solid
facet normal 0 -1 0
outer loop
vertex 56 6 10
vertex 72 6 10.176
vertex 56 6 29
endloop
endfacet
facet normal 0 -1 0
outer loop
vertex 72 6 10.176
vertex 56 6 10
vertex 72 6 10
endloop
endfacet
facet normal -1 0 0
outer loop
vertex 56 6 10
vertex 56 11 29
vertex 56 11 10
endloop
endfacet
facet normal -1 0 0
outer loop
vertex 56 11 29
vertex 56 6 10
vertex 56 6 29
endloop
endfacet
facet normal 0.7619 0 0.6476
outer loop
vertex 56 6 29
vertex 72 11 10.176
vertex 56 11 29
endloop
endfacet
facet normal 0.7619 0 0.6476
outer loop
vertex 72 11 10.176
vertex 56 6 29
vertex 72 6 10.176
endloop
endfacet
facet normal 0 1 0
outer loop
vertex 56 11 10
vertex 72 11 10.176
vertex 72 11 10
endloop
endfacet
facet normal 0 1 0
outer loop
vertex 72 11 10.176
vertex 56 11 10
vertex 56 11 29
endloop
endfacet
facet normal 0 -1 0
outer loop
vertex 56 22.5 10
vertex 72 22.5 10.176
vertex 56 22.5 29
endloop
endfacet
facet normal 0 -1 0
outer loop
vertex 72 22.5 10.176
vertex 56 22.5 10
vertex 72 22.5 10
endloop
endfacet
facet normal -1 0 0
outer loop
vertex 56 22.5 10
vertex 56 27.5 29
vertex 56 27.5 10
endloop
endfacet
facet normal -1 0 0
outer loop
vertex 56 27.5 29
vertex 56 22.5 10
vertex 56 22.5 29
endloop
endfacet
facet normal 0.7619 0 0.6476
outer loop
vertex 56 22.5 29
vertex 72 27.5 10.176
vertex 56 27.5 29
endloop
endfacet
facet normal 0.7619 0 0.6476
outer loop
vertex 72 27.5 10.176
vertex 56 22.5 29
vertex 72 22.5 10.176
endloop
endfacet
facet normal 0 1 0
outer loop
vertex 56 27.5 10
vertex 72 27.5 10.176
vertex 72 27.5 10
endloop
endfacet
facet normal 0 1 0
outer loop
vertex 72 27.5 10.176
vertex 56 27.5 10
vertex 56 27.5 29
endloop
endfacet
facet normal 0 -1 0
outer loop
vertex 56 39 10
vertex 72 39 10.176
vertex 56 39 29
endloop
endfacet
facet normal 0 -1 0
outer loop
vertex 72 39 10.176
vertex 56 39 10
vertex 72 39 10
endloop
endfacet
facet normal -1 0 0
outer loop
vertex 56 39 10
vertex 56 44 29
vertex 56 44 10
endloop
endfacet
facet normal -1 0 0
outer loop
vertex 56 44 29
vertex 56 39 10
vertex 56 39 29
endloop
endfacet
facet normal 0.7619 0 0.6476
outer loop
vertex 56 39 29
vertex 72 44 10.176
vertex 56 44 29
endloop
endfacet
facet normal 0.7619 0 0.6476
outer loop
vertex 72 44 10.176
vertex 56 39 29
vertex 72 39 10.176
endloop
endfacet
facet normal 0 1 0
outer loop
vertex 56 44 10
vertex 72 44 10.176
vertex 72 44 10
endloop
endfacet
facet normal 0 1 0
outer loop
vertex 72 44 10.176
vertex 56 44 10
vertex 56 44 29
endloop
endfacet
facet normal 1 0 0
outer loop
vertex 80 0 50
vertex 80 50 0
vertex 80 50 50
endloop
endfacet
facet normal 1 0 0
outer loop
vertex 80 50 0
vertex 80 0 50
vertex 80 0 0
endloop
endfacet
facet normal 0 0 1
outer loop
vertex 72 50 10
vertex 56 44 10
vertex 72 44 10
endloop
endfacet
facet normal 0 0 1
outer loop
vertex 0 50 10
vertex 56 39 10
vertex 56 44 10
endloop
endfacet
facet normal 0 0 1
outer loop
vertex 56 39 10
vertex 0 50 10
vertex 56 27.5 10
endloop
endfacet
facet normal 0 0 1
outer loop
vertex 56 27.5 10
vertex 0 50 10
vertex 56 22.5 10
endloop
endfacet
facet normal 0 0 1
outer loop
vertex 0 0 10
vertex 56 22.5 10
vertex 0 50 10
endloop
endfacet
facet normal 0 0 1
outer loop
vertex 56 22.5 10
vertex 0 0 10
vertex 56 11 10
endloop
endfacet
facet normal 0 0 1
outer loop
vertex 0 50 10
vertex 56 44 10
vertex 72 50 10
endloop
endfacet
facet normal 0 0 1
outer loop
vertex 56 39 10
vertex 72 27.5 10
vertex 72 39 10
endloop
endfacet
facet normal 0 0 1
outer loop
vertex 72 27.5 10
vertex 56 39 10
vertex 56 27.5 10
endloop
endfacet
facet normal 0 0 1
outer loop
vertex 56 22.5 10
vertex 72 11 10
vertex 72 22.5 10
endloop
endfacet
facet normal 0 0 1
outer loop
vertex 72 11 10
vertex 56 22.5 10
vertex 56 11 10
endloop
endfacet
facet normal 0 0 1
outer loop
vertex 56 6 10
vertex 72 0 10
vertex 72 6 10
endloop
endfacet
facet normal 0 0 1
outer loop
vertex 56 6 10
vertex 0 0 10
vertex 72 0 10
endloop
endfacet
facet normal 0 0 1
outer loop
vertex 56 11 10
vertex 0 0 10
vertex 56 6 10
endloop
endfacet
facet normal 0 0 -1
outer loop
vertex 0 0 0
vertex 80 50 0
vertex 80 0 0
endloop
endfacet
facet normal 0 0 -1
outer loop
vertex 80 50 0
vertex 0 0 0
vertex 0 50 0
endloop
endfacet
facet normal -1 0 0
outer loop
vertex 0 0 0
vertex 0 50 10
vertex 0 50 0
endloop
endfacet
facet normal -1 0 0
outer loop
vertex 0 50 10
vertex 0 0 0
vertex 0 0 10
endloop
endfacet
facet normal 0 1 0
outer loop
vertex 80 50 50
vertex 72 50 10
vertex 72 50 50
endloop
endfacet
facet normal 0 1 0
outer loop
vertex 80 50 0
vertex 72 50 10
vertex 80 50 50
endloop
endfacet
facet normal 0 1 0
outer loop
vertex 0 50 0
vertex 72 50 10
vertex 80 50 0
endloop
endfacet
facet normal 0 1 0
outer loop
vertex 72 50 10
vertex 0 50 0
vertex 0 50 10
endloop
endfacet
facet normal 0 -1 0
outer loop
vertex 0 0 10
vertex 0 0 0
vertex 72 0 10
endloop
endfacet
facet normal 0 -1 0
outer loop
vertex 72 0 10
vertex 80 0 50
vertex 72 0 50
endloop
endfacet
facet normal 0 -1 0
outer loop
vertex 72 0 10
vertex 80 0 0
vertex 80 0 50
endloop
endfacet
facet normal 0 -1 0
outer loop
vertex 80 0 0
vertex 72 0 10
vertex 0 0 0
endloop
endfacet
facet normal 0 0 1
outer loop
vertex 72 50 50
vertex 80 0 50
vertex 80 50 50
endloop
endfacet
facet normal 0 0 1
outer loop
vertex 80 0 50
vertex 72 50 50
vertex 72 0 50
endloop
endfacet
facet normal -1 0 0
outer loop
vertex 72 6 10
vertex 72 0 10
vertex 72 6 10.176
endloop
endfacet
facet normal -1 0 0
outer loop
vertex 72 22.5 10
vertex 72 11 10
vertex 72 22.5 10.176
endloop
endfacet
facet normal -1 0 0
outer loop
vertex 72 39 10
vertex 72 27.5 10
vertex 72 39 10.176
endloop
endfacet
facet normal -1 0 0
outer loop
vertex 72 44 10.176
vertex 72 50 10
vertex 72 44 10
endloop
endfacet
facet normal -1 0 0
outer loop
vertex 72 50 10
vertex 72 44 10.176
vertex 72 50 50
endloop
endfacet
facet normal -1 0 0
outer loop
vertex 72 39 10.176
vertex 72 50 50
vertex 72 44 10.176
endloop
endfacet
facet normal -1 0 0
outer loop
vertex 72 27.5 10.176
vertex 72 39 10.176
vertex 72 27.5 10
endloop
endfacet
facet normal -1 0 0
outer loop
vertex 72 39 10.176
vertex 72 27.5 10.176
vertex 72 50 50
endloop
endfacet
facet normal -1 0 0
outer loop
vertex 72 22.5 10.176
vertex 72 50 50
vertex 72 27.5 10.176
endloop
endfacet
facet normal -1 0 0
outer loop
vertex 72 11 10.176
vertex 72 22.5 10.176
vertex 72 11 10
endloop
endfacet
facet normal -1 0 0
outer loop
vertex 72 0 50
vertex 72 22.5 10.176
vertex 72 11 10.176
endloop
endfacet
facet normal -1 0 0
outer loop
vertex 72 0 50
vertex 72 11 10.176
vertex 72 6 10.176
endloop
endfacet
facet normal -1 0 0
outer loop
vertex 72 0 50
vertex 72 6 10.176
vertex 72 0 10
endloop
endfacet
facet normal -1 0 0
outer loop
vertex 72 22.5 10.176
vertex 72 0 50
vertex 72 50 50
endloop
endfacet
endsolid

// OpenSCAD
$fn = 32;

// ----------------------------------------------------------------------
// Rib bracket: 3-gusset L bracket
// ----------------------------------------------------------------------

// --- parameters (mm) ---
base_l = 80;              // foot length, X
base_w = 50;              // foot width, Y
base_t = 10;              // foot thickness
plate_t = 8;              // upright plate thickness
plate_h = 50;             // overall height
gus_l = 16;               // gusset leg along the foot
gus_h = 20;               // gusset height
gus_t = 5;                // gusset thickness
gus_edge = 6;             // gusset margin from the foot edge
n_gus = 3;                // gusset count

gus_pitch = (base_w - 2 * gus_edge - gus_t) / (n_gus - 1);  // gusset pitch

union() {
  cube([base_l, base_w, base_t]);
  translate([base_l - plate_t, 0, base_t - 1])
    cube([plate_t, base_w, plate_h - base_t + 1]);
  for (i = [0 : n_gus - 1])
    translate([base_l - plate_t - gus_l, gus_edge + i * gus_pitch, base_t - 1])
      rotate([-90, 0, 0])
        linear_extrude(height = gus_t)
          polygon(points = [[0, 0], [gus_l + 1, 0], [0, -gus_h]]);
}
